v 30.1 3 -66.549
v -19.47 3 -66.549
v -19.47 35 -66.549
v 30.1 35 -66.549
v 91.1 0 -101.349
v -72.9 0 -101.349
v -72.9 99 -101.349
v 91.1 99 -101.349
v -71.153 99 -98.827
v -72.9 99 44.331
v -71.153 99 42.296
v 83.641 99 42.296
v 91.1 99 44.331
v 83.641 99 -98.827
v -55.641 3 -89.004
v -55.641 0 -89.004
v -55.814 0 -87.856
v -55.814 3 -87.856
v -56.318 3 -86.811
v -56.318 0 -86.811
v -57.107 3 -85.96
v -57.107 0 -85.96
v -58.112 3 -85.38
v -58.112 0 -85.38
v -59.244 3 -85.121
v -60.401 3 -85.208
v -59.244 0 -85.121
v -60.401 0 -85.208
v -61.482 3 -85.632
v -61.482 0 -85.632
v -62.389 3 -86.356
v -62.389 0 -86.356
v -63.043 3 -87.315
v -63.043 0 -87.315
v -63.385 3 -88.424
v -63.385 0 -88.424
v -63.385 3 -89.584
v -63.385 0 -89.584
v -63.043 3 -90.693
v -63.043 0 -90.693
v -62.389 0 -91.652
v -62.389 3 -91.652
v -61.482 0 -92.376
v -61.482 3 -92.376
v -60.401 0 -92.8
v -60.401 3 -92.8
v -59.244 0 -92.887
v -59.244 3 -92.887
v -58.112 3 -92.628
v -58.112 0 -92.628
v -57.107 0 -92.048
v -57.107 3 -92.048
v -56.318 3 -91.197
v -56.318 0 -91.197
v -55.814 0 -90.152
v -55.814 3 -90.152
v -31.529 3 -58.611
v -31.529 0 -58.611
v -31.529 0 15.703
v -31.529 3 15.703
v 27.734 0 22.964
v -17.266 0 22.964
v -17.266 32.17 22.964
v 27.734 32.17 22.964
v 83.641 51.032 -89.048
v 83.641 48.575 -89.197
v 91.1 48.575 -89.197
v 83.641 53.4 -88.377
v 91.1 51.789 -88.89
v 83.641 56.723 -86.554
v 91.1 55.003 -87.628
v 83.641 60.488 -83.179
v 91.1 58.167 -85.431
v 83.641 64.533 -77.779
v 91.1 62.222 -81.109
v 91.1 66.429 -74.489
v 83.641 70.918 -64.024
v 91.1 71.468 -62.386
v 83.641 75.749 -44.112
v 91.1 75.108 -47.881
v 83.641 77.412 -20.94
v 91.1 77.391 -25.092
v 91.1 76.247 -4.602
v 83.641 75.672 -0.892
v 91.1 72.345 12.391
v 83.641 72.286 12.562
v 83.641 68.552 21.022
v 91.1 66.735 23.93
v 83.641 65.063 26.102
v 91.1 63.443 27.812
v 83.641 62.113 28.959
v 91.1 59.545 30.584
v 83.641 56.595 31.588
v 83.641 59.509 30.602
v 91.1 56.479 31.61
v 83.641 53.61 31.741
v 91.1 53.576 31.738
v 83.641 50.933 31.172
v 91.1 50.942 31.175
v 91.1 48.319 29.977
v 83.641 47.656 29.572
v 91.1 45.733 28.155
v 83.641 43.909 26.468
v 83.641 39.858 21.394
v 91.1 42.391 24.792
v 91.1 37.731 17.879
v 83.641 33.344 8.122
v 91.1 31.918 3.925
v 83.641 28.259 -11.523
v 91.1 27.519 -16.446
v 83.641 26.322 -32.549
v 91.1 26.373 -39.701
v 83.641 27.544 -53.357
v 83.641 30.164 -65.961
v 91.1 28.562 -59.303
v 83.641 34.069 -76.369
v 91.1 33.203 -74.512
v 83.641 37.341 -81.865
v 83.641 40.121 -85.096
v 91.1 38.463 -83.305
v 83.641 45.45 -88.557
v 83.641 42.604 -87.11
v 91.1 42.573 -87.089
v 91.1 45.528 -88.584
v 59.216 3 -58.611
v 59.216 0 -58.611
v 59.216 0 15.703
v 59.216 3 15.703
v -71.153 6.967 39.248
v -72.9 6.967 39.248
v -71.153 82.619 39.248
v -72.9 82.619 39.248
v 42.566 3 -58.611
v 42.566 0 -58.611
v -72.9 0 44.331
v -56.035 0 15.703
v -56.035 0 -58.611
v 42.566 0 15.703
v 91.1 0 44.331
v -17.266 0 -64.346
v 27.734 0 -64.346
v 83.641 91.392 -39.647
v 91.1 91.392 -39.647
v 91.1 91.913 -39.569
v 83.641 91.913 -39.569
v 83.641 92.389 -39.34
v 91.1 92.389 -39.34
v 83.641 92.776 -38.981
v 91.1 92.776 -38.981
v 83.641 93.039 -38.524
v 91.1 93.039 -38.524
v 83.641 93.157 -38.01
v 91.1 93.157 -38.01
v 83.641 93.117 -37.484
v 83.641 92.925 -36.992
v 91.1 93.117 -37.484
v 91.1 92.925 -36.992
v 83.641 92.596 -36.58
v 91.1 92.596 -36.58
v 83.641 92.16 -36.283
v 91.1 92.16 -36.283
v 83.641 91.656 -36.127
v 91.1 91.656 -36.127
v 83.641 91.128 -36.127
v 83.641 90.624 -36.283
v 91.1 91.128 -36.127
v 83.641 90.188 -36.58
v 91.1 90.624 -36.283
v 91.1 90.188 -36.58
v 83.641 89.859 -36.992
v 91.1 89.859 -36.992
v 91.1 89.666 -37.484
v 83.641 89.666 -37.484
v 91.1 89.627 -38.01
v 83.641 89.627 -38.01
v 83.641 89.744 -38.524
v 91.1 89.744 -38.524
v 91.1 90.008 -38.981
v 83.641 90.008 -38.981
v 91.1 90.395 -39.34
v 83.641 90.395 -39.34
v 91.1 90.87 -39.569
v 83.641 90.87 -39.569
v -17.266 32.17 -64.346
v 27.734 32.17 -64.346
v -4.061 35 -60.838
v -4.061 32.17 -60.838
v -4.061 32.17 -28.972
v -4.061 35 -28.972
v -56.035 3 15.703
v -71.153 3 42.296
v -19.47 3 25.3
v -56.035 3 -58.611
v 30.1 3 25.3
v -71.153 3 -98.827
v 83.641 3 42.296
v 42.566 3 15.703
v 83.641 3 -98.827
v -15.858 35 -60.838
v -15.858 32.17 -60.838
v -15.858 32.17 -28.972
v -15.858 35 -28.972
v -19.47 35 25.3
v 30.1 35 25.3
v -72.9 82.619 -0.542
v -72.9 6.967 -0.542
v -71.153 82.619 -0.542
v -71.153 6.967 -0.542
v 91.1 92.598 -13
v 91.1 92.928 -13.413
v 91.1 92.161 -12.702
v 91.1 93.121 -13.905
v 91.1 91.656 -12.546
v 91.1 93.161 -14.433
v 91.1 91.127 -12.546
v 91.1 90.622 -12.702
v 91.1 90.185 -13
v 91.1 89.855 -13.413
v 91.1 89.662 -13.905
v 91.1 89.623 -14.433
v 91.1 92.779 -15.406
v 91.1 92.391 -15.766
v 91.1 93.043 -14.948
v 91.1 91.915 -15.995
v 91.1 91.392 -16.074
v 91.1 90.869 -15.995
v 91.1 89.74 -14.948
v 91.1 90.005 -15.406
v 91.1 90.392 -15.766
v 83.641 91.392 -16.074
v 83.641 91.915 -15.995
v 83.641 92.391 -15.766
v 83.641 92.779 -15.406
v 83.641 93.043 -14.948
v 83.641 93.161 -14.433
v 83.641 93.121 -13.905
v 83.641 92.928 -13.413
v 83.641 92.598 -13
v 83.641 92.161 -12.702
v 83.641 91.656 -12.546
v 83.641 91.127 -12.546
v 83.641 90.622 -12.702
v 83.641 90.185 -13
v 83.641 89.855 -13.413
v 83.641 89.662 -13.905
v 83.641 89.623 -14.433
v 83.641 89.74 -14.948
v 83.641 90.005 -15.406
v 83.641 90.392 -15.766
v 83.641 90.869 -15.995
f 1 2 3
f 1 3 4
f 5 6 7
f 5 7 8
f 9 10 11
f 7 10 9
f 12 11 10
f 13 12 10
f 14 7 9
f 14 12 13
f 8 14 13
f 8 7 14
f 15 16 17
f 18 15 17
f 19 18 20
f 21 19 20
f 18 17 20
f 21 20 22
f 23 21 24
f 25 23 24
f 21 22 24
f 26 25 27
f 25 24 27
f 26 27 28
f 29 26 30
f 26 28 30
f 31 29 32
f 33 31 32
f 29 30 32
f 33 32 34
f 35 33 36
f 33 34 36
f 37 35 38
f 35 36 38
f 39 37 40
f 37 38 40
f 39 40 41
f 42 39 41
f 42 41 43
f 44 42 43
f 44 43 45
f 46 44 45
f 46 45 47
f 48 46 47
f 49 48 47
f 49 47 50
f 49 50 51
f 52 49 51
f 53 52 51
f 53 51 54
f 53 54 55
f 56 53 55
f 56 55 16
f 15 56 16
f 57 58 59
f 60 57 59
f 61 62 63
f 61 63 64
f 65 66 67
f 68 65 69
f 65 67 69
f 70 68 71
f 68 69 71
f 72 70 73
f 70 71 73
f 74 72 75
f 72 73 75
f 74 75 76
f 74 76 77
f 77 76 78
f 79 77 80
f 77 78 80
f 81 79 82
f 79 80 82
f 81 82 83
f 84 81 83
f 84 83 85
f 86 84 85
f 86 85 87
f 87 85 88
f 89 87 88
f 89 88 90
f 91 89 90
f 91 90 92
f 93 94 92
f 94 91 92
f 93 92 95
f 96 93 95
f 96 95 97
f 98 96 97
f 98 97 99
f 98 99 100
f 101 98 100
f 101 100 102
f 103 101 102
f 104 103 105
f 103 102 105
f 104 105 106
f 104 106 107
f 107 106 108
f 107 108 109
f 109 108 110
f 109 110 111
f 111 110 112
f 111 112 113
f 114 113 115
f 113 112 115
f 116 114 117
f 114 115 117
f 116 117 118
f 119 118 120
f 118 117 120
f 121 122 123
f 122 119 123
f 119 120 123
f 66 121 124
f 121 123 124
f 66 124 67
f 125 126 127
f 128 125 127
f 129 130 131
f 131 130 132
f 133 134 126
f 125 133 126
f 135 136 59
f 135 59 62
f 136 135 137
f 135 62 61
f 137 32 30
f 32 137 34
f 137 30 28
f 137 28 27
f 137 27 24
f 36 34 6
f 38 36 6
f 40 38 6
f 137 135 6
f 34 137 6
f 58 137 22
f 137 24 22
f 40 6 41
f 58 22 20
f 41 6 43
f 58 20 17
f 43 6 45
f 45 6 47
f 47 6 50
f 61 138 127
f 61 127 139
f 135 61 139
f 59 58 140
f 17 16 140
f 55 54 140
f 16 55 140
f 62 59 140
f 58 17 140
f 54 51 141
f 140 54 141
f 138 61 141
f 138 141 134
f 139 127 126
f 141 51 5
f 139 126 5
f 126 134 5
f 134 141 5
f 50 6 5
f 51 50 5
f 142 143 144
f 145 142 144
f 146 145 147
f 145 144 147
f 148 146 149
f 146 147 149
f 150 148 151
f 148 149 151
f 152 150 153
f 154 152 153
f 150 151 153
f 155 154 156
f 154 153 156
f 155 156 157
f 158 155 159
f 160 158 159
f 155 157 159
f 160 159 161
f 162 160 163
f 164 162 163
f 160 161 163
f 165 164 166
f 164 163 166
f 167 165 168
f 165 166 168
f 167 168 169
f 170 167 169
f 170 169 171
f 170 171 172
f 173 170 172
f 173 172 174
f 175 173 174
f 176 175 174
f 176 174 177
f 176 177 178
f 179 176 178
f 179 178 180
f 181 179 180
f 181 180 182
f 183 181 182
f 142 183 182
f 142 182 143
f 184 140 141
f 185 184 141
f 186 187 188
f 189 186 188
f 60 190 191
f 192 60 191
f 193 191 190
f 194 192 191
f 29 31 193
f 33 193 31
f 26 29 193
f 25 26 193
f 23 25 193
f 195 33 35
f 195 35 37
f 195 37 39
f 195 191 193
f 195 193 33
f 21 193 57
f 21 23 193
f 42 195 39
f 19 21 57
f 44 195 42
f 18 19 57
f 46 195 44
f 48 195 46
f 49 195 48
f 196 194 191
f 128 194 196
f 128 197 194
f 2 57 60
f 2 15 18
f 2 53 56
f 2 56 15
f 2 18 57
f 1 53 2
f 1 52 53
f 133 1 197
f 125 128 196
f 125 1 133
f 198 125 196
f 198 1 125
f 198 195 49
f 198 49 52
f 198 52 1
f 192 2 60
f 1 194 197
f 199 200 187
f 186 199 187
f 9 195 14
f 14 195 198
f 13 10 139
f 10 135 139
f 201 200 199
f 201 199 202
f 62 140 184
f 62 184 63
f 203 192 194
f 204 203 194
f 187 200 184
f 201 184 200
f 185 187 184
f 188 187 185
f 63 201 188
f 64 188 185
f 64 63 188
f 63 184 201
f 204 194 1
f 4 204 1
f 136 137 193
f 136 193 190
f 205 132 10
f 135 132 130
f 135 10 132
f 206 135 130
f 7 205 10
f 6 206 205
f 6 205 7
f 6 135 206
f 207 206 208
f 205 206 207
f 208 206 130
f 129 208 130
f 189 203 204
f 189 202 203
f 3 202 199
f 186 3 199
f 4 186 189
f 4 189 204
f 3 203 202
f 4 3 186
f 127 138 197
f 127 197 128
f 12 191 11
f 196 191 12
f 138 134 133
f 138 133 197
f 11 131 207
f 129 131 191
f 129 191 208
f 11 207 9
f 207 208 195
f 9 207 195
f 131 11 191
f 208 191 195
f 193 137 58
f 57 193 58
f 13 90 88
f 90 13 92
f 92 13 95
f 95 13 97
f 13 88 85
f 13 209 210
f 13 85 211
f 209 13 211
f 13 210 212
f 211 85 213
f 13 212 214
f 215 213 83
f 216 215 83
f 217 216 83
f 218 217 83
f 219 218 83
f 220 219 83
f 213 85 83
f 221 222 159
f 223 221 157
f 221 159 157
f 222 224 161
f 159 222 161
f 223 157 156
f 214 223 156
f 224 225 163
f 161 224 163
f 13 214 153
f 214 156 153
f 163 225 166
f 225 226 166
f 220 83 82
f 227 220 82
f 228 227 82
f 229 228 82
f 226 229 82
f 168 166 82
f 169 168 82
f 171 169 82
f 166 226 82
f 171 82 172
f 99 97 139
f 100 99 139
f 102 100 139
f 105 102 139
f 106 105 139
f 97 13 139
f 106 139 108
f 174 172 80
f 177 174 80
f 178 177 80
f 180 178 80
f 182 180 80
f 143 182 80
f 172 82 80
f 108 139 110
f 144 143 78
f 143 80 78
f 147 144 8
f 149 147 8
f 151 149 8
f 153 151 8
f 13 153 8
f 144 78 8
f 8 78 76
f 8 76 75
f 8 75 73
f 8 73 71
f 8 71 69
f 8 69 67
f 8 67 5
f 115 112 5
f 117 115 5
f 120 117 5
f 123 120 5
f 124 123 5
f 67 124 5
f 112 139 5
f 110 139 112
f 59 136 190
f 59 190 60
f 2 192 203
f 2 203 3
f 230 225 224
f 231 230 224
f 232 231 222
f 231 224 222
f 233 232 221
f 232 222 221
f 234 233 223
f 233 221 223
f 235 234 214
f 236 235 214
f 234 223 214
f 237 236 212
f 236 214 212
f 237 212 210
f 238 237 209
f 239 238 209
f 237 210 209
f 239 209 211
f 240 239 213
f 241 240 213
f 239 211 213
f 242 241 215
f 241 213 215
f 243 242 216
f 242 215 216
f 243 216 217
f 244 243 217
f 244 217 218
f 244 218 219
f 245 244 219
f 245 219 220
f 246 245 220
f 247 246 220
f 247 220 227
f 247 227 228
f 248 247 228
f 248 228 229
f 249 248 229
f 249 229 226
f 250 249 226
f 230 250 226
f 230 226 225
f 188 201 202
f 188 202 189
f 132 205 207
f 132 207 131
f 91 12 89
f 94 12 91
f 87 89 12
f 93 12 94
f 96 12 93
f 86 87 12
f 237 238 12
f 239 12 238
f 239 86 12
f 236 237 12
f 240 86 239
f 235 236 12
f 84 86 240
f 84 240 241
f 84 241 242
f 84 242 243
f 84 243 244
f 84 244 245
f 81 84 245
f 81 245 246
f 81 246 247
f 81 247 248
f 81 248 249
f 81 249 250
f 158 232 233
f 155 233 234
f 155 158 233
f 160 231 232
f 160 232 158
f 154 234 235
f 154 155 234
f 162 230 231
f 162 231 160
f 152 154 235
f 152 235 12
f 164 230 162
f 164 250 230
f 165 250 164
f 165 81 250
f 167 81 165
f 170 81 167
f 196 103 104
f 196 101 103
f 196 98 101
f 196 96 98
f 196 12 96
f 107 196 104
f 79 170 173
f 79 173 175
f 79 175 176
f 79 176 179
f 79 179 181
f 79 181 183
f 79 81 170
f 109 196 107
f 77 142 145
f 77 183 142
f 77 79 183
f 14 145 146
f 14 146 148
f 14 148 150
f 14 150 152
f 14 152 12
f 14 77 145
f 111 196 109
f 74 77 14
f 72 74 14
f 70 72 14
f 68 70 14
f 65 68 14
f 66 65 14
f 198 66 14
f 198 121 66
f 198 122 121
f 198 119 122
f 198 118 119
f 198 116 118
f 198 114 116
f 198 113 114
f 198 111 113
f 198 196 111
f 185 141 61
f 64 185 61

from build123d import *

# Parameters (mm, degrees)
SKETCH1_W           = 164
SKETCH1_H           = 145.68
BOSS_EXTRUDE1_DEPTH = 3
SKETCH2_W           = 164
SKETCH2_H           = 145.68
SKETCH2_W_2         = 154.794377853
SKETCH2_H_2         = 141.122884214
BOSS_EXTRUDE2_DEPTH = 96
SKETCH4_RX          = 60.571165747
SKETCH4_RY          = 25.38547853
CUT_EXTRUDE1_DEPTH  = 20
SKETCH6_W           = 39.790164022
SKETCH6_H           = 75.651590962
CUT_EXTRUDE3_DEPTH  = 20
SKETCH8_W           = 49.5692413
SKETCH8_H           = 91.849069086
BOSS_EXTRUDE3_DEPTH = 32
SKETCH7_W           = 45
SKETCH7_H           = 87.31
CUT_EXTRUDE4_DEPTH  = 32.17
SKETCH9_W           = 11.79717637
SKETCH9_H           = 31.86635219
CUT_EXTRUDE5_DEPTH  = 40
SKETCH11_W          = 16.650134538
SKETCH11_H          = 74.314635754
SKETCH11_W_2        = 24.505886262
CUT_EXTRUDE7_DEPTH  = 40
SKETCH12_R          = 1.77
SKETCH12_R_2        = 1.774021332
CUT_EXTRUDE8_DEPTH  = 40
SKETCH13_R          = 3.893526171
CUT_EXTRUDE9_DEPTH  = 40


with BuildPart() as part:
    # Sketch1 → Boss-Extrude1 (new body)
    with BuildSketch(Plane(origin=(0, 0, 0), x_dir=(1, 0, 0), z_dir=(0, 1, 0))):
        with Locations((9.099573667, 28.508659662)):
            Rectangle(SKETCH1_W, SKETCH1_H)
    extrude(amount=BOSS_EXTRUDE1_DEPTH)

    # Sketch2 → Boss-Extrude2 (add)
    with BuildSketch(Plane(origin=(0, 3, 0), x_dir=(1, 0, 0), z_dir=(0, 1, 0))):
        with Locations((9.099573667, 28.508659662)):
            Rectangle(SKETCH2_W, SKETCH2_H)
        with Locations((6.2438887, 28.265919971)):
            Rectangle(SKETCH2_W_2, SKETCH2_H_2, mode=Mode.SUBTRACT)
    extrude(amount=BOSS_EXTRUDE2_DEPTH)

    # Sketch4 → Cut-Extrude1 (cut)
    with BuildSketch(Plane(origin=(91.099573667, 0, 0), x_dir=(0, 0, -1), z_dir=(1, 0, 0))):
        with Locations(Location((28.714709394, 51.858345631), (0, 0, -3.107007487))):
            Ellipse(SKETCH4_RX, SKETCH4_RY)
    extrude(amount=-CUT_EXTRUDE1_DEPTH, mode=Mode.SUBTRACT)

    # Sketch6 → Cut-Extrude3 (cut)
    with BuildSketch(Plane.ZY.offset(72.900426333)):
        with Locations((19.353212204, 44.793227562)):
            Rectangle(SKETCH6_W, SKETCH6_H)
    extrude(amount=-CUT_EXTRUDE3_DEPTH, mode=Mode.SUBTRACT)

    # Sketch8 → Boss-Extrude3 (add)
    with BuildSketch(Plane(origin=(0, 3, 0), x_dir=(1, 0, 0), z_dir=(0, 1, 0))):
        with Locations((5.315093732, 20.62475692)):
            Rectangle(SKETCH8_W, SKETCH8_H)
    extrude(amount=BOSS_EXTRUDE3_DEPTH)

    # Sketch7 → Cut-Extrude4 (cut)
    with BuildSketch(Plane.XZ):
        with Locations((5.233997278, -20.691377503)):
            Rectangle(SKETCH7_W, SKETCH7_H)
    extrude(amount=-CUT_EXTRUDE4_DEPTH, mode=Mode.SUBTRACT)

    # Sketch9 → Cut-Extrude5 (cut)
    with BuildSketch(Plane.XZ.offset(-32.17)):
        with Locations((-9.959298471, -44.905011983)):
            Rectangle(SKETCH9_W, SKETCH9_H)
    extrude(amount=-CUT_EXTRUDE5_DEPTH, mode=Mode.SUBTRACT)

    # Sketch11 → Cut-Extrude7 (cut)
    with BuildSketch(Plane.XZ):
        with Locations((50.891184892, -21.453909531)):
            Rectangle(SKETCH11_W, SKETCH11_H)
        with Locations((-43.781754887, -21.453909531)):
            Rectangle(SKETCH11_W_2, SKETCH11_H)
    extrude(amount=-CUT_EXTRUDE7_DEPTH, mode=Mode.SUBTRACT)

    # Sketch12 → Cut-Extrude8 (cut)
    with BuildSketch(Plane(origin=(91.099573667, 0, 0), x_dir=(0, 0, -1), z_dir=(1, 0, 0))):
        with Locations((37.87743885, 91.391738709)):
            Circle(SKETCH12_R)
        with Locations((14.300129623, 91.391738709)):
            Circle(SKETCH12_R_2)
    extrude(amount=-CUT_EXTRUDE8_DEPTH, mode=Mode.SUBTRACT)

    # Sketch13 → Cut-Extrude9 (cut)
    with BuildSketch(Plane.XZ):
        with Locations((-59.534784008, -89.003983448)):
            Circle(SKETCH13_R)
    extrude(amount=-CUT_EXTRUDE9_DEPTH, mode=Mode.SUBTRACT)


solid = part.part
